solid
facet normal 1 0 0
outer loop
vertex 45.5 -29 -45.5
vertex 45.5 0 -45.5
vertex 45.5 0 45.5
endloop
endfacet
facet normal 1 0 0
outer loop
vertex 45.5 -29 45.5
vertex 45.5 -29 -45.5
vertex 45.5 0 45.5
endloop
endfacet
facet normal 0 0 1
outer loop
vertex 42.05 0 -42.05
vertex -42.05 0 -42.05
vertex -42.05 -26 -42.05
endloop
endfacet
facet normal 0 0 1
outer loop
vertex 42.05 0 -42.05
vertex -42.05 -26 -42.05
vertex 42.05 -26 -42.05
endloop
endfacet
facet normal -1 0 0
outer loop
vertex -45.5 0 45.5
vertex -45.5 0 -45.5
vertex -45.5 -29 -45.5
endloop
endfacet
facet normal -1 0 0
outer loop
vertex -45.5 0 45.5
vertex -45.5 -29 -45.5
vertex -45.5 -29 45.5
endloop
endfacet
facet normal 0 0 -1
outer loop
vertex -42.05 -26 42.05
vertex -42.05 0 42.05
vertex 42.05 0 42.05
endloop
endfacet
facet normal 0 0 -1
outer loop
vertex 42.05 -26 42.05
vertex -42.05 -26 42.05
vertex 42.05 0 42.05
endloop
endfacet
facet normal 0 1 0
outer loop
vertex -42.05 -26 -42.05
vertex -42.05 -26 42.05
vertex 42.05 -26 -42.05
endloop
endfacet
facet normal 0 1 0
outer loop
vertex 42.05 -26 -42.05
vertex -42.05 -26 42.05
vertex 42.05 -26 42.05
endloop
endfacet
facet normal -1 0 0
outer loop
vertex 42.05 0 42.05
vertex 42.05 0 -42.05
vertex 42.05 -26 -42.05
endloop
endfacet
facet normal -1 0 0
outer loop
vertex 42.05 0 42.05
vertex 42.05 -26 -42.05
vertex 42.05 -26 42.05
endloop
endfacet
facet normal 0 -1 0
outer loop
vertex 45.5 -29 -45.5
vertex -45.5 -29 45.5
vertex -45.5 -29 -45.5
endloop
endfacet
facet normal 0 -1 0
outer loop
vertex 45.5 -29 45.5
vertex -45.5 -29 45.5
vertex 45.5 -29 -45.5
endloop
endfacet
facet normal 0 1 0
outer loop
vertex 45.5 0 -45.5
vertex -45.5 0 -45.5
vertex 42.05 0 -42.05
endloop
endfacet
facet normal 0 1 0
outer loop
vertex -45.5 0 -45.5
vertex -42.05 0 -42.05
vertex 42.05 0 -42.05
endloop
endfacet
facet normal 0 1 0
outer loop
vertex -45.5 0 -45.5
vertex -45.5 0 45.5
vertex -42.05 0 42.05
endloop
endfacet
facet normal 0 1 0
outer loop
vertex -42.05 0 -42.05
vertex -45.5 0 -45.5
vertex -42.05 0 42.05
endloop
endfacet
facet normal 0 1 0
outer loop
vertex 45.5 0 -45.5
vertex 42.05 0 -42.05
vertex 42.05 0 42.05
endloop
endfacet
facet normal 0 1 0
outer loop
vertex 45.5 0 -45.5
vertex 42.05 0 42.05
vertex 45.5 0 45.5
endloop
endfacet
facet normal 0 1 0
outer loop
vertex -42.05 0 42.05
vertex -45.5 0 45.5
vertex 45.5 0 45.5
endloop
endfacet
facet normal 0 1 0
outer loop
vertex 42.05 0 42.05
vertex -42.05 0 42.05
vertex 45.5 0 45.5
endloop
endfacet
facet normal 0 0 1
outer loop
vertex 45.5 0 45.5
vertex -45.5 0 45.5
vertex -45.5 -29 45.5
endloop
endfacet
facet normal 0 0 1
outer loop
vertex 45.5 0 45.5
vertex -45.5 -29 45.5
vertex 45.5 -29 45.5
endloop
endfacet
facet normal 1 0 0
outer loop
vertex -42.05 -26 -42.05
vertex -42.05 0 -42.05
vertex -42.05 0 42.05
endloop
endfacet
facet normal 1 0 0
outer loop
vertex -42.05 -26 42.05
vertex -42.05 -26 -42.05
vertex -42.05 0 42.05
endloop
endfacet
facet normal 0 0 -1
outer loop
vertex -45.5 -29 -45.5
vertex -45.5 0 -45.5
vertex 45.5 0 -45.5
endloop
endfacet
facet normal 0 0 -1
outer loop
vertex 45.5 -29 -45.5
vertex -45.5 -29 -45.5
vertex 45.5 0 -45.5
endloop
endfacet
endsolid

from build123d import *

# Parameters (mm, degrees)
SKETCH_W     = 91
SKETCH_H     = 91
PAD_DEPTH    = 29
SKETCH001_W  = 84.1
SKETCH001_H  = 84.1
POCKET_DEPTH = 26


with BuildPart() as part:
    # Sketch (on XZ_Plane of Origin) → Pad (new body)
    with BuildSketch(Plane.XZ):
        Rectangle(SKETCH_W, SKETCH_H)
    extrude(amount=PAD_DEPTH)

    # Sketch001 (on XZ_Plane of Origin) → Pocket (cut)
    with BuildSketch(Plane.XZ):
        Rectangle(SKETCH001_W, SKETCH001_H)
    extrude(amount=POCKET_DEPTH, mode=Mode.SUBTRACT)


solid = part.part
